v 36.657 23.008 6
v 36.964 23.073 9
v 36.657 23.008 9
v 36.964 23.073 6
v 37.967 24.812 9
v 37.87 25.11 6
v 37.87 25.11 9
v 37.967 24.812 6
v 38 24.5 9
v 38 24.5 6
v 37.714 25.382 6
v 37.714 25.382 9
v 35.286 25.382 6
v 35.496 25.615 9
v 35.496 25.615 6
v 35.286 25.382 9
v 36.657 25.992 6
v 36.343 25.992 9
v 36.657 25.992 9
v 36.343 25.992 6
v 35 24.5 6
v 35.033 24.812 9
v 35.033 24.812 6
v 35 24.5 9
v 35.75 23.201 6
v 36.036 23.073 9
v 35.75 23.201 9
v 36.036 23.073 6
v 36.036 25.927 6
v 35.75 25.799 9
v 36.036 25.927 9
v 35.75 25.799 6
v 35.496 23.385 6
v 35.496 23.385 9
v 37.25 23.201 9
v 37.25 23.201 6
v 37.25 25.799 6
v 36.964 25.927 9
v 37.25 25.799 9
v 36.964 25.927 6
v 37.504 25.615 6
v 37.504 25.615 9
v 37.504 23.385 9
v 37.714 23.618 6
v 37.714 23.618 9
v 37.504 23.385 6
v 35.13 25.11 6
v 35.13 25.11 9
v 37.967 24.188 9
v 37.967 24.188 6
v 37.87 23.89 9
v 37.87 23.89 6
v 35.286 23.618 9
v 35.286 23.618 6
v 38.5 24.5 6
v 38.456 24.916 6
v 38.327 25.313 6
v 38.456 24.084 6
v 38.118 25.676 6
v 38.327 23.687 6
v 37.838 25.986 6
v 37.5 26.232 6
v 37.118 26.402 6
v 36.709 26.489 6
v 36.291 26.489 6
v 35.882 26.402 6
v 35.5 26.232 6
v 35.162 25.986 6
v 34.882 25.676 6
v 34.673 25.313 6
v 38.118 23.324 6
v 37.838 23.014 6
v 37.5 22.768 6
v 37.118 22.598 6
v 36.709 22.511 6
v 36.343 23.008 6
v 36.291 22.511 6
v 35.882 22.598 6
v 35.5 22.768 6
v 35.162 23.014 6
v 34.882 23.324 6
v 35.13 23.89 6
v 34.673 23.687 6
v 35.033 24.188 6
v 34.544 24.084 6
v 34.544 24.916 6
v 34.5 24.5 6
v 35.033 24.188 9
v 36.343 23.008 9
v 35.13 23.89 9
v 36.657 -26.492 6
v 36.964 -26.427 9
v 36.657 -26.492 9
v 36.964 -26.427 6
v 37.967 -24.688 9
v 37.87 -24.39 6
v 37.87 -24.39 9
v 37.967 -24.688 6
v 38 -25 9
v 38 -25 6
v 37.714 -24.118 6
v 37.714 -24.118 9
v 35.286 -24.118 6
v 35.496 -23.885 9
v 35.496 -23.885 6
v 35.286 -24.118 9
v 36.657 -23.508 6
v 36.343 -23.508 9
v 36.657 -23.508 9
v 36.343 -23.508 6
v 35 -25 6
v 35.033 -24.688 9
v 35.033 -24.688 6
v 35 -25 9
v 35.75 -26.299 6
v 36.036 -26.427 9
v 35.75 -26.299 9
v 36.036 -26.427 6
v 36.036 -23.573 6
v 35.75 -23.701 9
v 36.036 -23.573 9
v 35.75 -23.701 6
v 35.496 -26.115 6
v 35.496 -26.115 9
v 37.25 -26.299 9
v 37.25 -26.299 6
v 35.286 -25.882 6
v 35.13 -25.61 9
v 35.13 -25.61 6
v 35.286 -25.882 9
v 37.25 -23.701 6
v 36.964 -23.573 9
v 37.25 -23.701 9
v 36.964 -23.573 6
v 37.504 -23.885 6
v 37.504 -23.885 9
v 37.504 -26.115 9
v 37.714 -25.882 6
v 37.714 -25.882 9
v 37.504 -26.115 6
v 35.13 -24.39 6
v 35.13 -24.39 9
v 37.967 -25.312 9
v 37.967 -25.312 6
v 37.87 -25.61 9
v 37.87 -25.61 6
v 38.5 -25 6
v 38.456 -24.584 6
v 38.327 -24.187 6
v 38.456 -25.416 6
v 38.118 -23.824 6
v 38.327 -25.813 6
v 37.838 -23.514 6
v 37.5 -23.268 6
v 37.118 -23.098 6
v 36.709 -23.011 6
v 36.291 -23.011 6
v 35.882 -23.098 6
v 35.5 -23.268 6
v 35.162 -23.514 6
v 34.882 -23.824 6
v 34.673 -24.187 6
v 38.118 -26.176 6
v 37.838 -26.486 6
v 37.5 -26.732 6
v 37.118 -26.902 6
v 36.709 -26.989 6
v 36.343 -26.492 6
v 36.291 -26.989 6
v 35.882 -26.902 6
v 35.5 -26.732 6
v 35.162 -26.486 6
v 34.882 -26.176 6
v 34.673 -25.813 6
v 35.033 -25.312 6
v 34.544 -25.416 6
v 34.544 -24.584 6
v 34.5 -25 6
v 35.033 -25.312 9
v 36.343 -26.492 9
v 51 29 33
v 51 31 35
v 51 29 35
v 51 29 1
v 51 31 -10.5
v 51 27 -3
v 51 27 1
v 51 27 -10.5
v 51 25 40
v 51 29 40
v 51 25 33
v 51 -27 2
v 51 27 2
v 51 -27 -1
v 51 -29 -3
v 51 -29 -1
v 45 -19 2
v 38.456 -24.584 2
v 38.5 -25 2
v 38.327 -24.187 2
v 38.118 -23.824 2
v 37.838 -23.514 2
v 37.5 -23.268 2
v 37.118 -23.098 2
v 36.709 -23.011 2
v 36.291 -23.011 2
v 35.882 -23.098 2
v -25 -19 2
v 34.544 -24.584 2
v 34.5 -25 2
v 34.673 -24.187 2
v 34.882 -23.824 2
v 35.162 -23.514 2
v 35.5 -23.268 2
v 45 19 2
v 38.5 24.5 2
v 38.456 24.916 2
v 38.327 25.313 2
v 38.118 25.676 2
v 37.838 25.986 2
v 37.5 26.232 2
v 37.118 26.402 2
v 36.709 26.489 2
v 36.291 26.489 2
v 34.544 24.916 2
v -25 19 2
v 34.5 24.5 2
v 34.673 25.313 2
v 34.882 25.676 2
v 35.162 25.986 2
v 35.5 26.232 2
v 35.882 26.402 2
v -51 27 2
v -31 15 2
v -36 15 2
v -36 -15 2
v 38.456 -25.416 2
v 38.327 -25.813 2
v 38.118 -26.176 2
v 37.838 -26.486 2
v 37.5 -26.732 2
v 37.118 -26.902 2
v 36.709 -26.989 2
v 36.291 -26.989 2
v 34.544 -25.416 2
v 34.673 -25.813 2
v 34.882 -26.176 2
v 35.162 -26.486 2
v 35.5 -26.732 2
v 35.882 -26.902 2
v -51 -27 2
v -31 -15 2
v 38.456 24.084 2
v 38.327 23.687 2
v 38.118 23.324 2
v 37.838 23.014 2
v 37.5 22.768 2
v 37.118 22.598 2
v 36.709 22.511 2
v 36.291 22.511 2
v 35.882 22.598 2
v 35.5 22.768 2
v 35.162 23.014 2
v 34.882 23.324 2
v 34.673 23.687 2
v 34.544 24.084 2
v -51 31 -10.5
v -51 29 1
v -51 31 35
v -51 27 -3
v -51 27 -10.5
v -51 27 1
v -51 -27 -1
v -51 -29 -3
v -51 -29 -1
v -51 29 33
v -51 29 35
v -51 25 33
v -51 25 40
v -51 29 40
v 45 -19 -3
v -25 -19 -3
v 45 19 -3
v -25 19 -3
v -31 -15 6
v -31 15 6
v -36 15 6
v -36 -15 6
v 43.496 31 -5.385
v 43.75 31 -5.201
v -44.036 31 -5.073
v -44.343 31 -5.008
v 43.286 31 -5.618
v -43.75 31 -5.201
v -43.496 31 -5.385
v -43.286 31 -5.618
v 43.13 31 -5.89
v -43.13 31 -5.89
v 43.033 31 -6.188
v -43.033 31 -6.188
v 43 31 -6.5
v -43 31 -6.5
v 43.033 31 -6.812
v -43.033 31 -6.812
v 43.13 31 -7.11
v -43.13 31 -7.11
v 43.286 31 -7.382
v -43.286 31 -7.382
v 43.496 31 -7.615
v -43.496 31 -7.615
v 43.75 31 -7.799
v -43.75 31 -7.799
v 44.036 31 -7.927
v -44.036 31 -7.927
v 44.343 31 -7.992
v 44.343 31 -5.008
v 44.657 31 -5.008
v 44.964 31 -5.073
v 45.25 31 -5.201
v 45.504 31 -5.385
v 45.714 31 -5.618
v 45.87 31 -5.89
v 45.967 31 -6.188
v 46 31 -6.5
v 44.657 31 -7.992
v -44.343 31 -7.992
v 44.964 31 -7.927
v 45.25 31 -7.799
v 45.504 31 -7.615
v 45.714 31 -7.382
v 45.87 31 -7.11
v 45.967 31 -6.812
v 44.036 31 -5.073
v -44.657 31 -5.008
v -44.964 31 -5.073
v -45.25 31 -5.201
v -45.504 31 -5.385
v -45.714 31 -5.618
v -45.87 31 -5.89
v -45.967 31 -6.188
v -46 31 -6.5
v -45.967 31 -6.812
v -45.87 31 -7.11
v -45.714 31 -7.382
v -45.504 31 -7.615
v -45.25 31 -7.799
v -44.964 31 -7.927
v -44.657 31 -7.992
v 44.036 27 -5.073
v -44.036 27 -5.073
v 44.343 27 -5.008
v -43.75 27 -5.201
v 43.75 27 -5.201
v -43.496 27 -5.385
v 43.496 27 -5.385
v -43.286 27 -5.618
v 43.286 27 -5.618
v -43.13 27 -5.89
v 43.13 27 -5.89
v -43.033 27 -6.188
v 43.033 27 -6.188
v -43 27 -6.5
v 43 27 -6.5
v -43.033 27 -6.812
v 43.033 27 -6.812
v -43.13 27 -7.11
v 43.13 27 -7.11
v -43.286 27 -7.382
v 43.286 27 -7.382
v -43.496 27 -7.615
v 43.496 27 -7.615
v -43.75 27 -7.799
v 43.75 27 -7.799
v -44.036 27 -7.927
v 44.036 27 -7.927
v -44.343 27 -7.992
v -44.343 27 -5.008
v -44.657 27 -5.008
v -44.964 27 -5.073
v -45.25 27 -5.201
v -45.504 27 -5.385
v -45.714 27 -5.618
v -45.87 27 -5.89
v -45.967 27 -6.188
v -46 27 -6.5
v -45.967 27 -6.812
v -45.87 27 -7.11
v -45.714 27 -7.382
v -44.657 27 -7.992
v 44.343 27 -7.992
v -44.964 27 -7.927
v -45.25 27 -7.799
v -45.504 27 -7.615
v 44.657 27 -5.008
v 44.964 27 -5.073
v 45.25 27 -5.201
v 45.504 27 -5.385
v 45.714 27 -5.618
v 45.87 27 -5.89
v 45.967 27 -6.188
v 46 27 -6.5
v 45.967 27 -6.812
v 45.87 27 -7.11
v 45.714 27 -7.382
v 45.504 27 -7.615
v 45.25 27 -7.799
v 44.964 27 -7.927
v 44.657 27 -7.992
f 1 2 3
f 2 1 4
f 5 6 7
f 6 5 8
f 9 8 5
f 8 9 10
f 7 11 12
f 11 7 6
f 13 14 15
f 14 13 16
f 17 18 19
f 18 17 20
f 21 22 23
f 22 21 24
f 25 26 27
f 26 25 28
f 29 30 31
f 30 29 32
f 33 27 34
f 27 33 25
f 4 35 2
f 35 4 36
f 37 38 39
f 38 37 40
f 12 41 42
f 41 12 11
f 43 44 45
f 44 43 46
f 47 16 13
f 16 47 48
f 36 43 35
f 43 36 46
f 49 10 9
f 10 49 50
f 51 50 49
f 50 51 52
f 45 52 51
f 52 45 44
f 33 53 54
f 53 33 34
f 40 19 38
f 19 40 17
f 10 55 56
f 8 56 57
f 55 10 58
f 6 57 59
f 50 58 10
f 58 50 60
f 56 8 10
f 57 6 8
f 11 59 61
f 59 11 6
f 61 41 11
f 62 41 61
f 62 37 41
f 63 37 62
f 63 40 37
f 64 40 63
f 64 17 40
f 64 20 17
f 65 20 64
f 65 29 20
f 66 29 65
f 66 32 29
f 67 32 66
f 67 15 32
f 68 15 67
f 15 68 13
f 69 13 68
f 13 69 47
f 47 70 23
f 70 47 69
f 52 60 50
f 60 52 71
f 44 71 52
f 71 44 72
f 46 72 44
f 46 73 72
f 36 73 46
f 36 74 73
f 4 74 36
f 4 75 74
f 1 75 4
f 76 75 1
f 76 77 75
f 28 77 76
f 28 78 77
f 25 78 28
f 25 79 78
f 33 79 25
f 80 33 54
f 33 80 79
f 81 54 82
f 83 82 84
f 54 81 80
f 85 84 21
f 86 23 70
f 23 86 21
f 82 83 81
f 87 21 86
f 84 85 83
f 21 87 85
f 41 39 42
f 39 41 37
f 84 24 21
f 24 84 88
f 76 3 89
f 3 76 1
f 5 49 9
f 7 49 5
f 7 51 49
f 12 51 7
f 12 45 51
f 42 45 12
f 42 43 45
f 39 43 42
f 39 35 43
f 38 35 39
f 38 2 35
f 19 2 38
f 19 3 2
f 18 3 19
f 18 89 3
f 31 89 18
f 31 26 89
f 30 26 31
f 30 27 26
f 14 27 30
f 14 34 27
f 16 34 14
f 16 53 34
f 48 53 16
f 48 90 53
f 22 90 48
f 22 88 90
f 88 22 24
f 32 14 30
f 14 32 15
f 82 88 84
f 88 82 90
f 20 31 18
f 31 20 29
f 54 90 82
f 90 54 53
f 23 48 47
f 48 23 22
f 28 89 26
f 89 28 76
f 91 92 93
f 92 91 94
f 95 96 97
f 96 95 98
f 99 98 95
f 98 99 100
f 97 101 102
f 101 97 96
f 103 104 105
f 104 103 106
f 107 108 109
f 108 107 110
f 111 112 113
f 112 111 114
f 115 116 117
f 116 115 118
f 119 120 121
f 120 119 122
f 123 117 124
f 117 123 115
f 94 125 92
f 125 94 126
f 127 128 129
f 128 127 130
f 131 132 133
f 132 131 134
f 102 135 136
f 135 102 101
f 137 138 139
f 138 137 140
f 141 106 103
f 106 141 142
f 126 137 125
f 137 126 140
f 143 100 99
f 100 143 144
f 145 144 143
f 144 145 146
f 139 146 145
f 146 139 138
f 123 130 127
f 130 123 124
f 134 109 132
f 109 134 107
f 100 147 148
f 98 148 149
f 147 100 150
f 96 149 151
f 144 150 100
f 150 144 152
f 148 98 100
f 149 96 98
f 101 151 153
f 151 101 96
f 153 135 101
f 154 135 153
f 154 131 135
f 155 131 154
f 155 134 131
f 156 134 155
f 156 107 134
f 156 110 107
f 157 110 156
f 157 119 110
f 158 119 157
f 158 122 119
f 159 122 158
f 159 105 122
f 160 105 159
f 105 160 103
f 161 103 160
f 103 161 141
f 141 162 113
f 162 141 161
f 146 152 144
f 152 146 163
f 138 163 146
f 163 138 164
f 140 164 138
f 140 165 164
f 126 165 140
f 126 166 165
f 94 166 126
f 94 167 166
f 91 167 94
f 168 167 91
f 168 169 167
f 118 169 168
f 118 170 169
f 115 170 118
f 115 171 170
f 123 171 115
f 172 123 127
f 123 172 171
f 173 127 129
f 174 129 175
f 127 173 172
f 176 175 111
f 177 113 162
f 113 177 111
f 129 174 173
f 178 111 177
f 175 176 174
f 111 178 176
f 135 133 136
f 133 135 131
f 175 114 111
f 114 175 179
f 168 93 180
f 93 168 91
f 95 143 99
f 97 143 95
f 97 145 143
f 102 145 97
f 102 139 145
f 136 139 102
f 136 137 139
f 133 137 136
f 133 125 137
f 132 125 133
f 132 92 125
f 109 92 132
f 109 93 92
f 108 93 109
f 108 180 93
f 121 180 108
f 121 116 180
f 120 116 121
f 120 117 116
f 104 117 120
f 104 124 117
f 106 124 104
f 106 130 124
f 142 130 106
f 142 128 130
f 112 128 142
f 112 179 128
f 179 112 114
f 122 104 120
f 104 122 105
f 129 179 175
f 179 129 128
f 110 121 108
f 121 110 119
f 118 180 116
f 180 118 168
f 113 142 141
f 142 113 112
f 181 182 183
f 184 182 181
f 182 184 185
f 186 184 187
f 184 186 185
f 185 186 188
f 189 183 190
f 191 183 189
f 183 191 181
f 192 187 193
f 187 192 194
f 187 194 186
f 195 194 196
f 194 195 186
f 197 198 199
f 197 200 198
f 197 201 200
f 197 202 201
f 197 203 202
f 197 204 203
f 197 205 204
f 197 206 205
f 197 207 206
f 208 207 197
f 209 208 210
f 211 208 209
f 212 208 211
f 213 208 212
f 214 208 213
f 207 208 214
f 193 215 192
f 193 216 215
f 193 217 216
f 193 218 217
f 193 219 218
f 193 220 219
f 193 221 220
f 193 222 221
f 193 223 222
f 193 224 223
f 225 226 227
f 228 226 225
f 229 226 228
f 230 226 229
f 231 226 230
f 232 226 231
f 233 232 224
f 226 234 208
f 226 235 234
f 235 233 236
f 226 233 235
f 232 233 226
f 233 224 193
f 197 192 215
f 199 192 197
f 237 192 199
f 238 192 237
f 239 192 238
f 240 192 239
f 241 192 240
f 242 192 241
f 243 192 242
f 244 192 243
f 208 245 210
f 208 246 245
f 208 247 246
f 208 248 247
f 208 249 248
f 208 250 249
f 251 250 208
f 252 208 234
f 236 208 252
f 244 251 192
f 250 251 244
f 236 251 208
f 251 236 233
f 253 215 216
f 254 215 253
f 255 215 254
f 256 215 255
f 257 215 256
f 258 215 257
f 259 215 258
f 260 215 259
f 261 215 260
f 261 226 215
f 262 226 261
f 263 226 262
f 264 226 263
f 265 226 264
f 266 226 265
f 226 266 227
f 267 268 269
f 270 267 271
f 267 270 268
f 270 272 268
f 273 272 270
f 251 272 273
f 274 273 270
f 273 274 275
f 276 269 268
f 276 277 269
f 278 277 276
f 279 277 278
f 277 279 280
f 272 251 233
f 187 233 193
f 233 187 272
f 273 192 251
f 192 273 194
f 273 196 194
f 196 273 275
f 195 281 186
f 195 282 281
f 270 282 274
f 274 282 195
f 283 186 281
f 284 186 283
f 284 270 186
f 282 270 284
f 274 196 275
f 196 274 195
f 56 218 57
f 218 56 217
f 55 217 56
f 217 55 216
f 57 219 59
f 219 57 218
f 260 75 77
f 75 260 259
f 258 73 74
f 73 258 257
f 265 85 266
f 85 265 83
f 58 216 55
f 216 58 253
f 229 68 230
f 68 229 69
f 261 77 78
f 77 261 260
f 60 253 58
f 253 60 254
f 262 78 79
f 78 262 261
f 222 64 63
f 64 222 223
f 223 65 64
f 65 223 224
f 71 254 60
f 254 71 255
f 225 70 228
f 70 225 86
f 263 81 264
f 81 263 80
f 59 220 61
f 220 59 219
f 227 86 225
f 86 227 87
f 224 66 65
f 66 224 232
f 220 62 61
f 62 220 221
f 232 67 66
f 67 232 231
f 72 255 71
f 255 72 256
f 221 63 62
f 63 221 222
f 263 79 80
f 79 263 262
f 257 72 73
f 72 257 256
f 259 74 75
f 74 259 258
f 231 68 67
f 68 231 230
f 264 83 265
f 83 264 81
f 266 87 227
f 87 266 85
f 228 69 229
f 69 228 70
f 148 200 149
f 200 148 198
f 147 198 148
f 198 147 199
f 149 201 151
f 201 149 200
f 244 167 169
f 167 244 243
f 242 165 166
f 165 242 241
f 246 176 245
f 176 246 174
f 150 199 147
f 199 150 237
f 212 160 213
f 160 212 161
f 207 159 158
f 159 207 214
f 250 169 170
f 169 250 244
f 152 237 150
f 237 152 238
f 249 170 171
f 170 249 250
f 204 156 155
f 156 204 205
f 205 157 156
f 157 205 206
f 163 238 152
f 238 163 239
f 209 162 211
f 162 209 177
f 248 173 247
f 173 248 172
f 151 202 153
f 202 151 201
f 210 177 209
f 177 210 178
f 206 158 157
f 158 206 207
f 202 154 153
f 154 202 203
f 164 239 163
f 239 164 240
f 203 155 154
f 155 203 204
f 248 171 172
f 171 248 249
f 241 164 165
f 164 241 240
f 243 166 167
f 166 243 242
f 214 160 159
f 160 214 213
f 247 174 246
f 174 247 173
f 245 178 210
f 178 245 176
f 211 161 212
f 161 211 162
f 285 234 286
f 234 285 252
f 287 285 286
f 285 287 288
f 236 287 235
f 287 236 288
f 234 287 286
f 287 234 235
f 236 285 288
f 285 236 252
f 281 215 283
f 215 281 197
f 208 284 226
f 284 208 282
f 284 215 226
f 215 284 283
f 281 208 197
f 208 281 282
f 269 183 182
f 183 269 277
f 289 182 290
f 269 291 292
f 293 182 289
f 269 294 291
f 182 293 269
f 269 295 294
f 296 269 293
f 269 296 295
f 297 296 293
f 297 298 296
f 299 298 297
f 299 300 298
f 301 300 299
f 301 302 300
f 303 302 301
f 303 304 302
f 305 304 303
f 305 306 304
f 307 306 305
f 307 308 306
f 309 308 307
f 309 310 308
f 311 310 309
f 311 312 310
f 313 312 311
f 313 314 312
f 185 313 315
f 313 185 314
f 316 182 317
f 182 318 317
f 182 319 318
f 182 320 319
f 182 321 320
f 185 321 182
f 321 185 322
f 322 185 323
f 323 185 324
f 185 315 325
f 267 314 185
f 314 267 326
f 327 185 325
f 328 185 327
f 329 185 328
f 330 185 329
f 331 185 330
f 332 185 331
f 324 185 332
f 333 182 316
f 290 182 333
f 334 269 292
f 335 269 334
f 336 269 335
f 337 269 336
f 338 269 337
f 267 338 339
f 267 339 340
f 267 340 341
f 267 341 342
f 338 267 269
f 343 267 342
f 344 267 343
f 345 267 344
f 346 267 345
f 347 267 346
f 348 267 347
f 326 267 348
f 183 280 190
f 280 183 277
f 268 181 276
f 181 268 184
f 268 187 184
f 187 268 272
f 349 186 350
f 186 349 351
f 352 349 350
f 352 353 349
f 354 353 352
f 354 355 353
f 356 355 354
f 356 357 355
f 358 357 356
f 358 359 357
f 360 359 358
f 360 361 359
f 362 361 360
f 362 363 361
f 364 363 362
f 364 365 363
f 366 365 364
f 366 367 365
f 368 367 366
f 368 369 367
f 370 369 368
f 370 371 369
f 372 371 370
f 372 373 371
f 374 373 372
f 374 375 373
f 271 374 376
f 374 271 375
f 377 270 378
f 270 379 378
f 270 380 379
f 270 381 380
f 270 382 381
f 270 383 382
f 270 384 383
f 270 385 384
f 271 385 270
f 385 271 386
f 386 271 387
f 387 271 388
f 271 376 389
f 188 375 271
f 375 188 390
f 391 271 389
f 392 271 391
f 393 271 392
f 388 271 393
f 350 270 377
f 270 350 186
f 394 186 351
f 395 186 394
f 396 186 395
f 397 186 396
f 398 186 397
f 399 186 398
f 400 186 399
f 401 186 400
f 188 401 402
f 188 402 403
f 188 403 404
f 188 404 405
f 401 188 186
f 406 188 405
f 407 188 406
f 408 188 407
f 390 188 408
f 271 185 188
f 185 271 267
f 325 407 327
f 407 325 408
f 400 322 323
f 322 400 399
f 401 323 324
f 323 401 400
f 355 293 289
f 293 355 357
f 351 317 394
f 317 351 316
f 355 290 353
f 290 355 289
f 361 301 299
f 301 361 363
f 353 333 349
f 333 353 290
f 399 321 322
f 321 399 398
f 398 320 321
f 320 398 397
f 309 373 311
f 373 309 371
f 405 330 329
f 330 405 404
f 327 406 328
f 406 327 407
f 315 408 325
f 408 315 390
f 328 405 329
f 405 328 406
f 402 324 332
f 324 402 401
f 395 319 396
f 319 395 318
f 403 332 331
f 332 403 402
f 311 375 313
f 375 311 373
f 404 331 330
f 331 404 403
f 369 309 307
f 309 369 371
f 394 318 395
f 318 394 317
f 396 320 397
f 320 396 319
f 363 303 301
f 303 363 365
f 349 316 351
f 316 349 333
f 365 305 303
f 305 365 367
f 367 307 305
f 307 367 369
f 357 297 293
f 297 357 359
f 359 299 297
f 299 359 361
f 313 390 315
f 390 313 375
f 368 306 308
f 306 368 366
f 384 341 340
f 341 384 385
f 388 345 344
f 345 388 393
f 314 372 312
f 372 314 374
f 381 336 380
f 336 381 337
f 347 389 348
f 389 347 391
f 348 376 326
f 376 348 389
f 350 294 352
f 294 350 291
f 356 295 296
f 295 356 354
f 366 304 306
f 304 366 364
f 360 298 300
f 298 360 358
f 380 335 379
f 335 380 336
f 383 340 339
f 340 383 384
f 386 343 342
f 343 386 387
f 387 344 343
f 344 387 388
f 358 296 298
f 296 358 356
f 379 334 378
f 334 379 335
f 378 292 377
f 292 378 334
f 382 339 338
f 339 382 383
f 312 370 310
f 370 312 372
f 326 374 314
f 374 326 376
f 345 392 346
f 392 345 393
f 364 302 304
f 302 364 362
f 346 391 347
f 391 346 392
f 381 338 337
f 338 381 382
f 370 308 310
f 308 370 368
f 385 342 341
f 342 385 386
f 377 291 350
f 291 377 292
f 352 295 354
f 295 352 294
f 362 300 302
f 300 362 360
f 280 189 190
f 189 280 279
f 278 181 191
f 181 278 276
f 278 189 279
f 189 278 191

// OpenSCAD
ARDUINO_MEGA_LENGTH = 102;
ARDUINO_MEGA_WIDTH = 54;
ARDUINO_BOTTOM_CLEARANCE = 4;
ARDUINO_THROUGH_HOLE_RADIUS = 1.5;
BOTTOM_HEIGHT = 4;
BOTTOM_WINGS = 2;

$fs = 0.25;

module mega_mount() {
    clearance_center = BOTTOM_HEIGHT/2 + ARDUINO_BOTTOM_CLEARANCE/2;

    cube([ARDUINO_MEGA_LENGTH, ARDUINO_MEGA_WIDTH, BOTTOM_HEIGHT], center=true);
    
    translate([0, 0, -2]) {
        cube([ARDUINO_MEGA_LENGTH, ARDUINO_MEGA_WIDTH + BOTTOM_WINGS*2, 2], center=true);
    }

    translate([ARDUINO_MEGA_LENGTH/2 - 1.5 - 13, ARDUINO_MEGA_WIDTH/2 - 1.5 - 1, clearance_center]) {
        cylinder(
            ARDUINO_BOTTOM_CLEARANCE,
            ARDUINO_THROUGH_HOLE_RADIUS + 0.5,
            ARDUINO_THROUGH_HOLE_RADIUS + 0.5,
            center=true
        );
    }

    translate([ARDUINO_MEGA_LENGTH/2 - 1.5 - 13, -ARDUINO_MEGA_WIDTH/2 + 1.5 + 0.5, clearance_center]) {
        cylinder(
            ARDUINO_BOTTOM_CLEARANCE,
            ARDUINO_THROUGH_HOLE_RADIUS + 0.5,
            ARDUINO_THROUGH_HOLE_RADIUS + 0.5,
            center=true
        );
    }
    
    translate([0, 0, ARDUINO_BOTTOM_CLEARANCE + BOTTOM_HEIGHT/2]) {
        translate([ARDUINO_MEGA_LENGTH/2 - 1.5 - 13, ARDUINO_MEGA_WIDTH/2 - 1.5 - 1, 1.5]) {
            cylinder(
                3,
                ARDUINO_THROUGH_HOLE_RADIUS,
                ARDUINO_THROUGH_HOLE_RADIUS,
                center=true
            );
        }

        translate([ARDUINO_MEGA_LENGTH/2 - 1.5 - 13, -ARDUINO_MEGA_WIDTH/2 + 1.5 + 0.5, 1.5]) {
            cylinder(
                3,
                ARDUINO_THROUGH_HOLE_RADIUS,
                ARDUINO_THROUGH_HOLE_RADIUS,
                center=true
            );
        }
    }

    translate([-ARDUINO_MEGA_LENGTH/2 + 15 + 5/2, 0, clearance_center]) {
        cube([5, 30, ARDUINO_BOTTOM_CLEARANCE], center=true);
    }
}

color("green") {
    difference() {
        mega_mount();
        translate([10, 0, 0]) {
            cube([ARDUINO_MEGA_LENGTH - 32, ARDUINO_MEGA_WIDTH - 16, BOTTOM_HEIGHT + 4], center=true);
        }
    }
}

WALLS_WIDTH = 2;
WALLS_HEIGHT = 40;

module m3_hole() {
    translate([ARDUINO_MEGA_LENGTH/2 - 6/2 - 3.5, ARDUINO_MEGA_WIDTH/2 + WALLS_WIDTH/2, -6/2 - 3.5]) {
        //cube([6, 2.5, 6], center=true);
        rotate([90, 0, 0]) {
            cylinder(8, 1.5, 1.5, center=true);
        }
    }
}

difference() {
    translate([0, ARDUINO_MEGA_WIDTH/2 + WALLS_WIDTH/2 + 2, 0]) {
        translate([0, 0, WALLS_HEIGHT/2 - BOTTOM_HEIGHT/2 - 3]) {
            cube([ARDUINO_MEGA_LENGTH, WALLS_WIDTH, WALLS_HEIGHT], center=true);
        }
        translate([0, -2, 0]) {
            cube([ARDUINO_MEGA_LENGTH, 2, 2], center=true);
        }
        translate([0, -2, -4]) {
            cube([ARDUINO_MEGA_LENGTH, 2, 2], center=true);
        }
        translate([0, -1, -7]) {
            cube([ARDUINO_MEGA_LENGTH, 4, 7], center=true);
        }
    }
    m3_hole();
    mirror([1, 0, 0]) {
        m3_hole();
    }
}
translate([0, ARDUINO_MEGA_WIDTH/2 + WALLS_WIDTH/2 + 2, 0]) {
    translate([0, -3, WALLS_HEIGHT - 7/2]) {
        cube([ARDUINO_MEGA_LENGTH, 4, 7], center=true);
    }
}
